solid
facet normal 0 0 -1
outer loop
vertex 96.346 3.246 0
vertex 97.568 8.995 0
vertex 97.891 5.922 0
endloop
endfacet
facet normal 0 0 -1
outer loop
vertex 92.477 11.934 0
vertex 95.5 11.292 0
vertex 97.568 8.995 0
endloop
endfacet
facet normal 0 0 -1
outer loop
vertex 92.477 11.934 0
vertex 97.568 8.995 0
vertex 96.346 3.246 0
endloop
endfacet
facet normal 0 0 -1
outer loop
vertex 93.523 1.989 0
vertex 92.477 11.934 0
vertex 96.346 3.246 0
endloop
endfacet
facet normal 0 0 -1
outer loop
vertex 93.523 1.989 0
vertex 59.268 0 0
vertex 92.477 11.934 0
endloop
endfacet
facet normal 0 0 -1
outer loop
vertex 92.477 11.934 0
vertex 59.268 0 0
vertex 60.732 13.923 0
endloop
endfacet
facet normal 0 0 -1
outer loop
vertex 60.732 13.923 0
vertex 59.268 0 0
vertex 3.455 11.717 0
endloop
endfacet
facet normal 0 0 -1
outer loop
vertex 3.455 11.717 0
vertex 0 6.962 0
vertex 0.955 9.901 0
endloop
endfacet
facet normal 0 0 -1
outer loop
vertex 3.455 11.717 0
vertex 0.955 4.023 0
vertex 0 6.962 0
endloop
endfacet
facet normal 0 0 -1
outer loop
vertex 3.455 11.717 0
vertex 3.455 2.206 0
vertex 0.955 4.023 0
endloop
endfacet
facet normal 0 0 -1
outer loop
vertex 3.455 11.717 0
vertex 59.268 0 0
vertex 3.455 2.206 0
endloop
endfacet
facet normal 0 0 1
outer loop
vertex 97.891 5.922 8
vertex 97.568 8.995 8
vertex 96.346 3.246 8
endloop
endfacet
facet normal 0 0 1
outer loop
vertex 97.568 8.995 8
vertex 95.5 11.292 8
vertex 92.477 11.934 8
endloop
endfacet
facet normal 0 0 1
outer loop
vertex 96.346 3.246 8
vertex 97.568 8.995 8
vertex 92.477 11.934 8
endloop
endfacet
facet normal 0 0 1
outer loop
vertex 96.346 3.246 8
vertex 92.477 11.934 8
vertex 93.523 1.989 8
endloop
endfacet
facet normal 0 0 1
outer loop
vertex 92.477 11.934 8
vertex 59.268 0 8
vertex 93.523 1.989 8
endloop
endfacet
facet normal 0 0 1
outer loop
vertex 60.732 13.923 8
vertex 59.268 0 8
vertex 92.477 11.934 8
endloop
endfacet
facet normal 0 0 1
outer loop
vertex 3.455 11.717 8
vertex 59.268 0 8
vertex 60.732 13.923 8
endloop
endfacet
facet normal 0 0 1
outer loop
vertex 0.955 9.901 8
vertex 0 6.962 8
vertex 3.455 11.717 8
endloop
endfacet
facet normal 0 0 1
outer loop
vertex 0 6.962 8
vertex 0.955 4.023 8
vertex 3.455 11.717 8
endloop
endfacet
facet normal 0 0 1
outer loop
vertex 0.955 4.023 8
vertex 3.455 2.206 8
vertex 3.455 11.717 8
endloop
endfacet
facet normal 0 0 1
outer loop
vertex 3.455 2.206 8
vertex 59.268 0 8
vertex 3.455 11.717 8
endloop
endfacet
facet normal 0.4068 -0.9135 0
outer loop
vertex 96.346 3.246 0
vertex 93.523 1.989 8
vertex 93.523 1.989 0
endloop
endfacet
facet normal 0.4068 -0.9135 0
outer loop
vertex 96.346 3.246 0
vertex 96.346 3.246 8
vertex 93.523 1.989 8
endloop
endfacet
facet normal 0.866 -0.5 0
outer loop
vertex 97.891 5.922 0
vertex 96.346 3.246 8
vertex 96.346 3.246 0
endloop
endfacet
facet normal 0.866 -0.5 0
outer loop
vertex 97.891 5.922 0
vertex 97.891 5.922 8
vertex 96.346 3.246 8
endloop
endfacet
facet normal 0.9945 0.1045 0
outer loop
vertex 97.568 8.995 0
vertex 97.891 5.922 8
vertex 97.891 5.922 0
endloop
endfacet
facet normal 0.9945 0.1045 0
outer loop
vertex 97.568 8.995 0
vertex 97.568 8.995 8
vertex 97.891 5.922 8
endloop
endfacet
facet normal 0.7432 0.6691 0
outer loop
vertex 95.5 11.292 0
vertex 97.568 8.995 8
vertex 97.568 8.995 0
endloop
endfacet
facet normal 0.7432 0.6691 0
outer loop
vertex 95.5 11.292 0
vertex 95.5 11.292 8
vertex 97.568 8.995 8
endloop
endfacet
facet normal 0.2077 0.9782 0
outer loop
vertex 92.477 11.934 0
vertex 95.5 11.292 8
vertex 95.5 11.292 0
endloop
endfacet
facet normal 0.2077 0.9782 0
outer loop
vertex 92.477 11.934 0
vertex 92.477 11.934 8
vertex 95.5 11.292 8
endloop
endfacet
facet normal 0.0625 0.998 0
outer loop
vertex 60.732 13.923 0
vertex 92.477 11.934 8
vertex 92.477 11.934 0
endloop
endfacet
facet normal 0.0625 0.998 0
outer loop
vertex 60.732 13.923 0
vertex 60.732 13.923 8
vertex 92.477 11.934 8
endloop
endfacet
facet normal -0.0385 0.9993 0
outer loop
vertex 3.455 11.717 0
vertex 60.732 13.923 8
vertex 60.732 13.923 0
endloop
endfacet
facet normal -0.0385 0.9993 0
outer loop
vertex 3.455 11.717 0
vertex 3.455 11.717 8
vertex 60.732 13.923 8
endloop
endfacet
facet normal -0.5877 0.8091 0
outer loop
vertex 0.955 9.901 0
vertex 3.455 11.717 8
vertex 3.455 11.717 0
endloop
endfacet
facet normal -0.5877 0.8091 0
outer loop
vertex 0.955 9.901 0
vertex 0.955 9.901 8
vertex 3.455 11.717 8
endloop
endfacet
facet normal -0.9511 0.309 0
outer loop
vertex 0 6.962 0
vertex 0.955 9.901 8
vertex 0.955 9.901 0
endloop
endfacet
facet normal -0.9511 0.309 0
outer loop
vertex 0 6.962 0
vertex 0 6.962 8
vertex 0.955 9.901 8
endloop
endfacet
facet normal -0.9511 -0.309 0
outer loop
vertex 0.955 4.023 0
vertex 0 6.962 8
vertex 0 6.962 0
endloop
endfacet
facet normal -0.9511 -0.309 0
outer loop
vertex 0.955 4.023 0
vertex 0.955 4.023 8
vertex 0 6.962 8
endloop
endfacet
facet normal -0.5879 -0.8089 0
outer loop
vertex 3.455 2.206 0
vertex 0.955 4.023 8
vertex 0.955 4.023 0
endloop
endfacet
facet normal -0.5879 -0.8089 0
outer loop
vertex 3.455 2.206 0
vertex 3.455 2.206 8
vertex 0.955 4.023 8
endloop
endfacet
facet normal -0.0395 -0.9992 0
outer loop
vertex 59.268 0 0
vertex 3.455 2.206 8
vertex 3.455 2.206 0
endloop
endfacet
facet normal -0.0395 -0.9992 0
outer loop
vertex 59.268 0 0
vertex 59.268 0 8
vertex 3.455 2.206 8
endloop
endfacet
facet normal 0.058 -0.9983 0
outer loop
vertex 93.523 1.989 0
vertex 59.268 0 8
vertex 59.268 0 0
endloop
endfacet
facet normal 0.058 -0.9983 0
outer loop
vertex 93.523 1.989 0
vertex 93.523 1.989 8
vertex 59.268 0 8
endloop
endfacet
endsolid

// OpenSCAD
$fn = 32;

// ----------------------------------------------------------------------
// Lever arm: two bosses 10 and 14 mm, 55 mm between centres
// ----------------------------------------------------------------------

// --- parameters (mm) ---
profile_height = 8;       // extrusion height
profile_points = 13;      // points of the closed outline

profile = [[0, 6.962], [0.955, 4.023], [3.455, 2.206], [59.268, 0], [93.523, 1.989], [96.346, 3.246], [97.891, 5.922], [97.568, 8.995], [95.5, 11.292], [92.477, 11.934], [60.732, 13.923], [3.455, 11.717], [0.955, 9.901]];  // single closed polygon, 13 points, counter clockwise

// --- the one profile operation ---
linear_extrude(height = profile_height) polygon(points = profile);
